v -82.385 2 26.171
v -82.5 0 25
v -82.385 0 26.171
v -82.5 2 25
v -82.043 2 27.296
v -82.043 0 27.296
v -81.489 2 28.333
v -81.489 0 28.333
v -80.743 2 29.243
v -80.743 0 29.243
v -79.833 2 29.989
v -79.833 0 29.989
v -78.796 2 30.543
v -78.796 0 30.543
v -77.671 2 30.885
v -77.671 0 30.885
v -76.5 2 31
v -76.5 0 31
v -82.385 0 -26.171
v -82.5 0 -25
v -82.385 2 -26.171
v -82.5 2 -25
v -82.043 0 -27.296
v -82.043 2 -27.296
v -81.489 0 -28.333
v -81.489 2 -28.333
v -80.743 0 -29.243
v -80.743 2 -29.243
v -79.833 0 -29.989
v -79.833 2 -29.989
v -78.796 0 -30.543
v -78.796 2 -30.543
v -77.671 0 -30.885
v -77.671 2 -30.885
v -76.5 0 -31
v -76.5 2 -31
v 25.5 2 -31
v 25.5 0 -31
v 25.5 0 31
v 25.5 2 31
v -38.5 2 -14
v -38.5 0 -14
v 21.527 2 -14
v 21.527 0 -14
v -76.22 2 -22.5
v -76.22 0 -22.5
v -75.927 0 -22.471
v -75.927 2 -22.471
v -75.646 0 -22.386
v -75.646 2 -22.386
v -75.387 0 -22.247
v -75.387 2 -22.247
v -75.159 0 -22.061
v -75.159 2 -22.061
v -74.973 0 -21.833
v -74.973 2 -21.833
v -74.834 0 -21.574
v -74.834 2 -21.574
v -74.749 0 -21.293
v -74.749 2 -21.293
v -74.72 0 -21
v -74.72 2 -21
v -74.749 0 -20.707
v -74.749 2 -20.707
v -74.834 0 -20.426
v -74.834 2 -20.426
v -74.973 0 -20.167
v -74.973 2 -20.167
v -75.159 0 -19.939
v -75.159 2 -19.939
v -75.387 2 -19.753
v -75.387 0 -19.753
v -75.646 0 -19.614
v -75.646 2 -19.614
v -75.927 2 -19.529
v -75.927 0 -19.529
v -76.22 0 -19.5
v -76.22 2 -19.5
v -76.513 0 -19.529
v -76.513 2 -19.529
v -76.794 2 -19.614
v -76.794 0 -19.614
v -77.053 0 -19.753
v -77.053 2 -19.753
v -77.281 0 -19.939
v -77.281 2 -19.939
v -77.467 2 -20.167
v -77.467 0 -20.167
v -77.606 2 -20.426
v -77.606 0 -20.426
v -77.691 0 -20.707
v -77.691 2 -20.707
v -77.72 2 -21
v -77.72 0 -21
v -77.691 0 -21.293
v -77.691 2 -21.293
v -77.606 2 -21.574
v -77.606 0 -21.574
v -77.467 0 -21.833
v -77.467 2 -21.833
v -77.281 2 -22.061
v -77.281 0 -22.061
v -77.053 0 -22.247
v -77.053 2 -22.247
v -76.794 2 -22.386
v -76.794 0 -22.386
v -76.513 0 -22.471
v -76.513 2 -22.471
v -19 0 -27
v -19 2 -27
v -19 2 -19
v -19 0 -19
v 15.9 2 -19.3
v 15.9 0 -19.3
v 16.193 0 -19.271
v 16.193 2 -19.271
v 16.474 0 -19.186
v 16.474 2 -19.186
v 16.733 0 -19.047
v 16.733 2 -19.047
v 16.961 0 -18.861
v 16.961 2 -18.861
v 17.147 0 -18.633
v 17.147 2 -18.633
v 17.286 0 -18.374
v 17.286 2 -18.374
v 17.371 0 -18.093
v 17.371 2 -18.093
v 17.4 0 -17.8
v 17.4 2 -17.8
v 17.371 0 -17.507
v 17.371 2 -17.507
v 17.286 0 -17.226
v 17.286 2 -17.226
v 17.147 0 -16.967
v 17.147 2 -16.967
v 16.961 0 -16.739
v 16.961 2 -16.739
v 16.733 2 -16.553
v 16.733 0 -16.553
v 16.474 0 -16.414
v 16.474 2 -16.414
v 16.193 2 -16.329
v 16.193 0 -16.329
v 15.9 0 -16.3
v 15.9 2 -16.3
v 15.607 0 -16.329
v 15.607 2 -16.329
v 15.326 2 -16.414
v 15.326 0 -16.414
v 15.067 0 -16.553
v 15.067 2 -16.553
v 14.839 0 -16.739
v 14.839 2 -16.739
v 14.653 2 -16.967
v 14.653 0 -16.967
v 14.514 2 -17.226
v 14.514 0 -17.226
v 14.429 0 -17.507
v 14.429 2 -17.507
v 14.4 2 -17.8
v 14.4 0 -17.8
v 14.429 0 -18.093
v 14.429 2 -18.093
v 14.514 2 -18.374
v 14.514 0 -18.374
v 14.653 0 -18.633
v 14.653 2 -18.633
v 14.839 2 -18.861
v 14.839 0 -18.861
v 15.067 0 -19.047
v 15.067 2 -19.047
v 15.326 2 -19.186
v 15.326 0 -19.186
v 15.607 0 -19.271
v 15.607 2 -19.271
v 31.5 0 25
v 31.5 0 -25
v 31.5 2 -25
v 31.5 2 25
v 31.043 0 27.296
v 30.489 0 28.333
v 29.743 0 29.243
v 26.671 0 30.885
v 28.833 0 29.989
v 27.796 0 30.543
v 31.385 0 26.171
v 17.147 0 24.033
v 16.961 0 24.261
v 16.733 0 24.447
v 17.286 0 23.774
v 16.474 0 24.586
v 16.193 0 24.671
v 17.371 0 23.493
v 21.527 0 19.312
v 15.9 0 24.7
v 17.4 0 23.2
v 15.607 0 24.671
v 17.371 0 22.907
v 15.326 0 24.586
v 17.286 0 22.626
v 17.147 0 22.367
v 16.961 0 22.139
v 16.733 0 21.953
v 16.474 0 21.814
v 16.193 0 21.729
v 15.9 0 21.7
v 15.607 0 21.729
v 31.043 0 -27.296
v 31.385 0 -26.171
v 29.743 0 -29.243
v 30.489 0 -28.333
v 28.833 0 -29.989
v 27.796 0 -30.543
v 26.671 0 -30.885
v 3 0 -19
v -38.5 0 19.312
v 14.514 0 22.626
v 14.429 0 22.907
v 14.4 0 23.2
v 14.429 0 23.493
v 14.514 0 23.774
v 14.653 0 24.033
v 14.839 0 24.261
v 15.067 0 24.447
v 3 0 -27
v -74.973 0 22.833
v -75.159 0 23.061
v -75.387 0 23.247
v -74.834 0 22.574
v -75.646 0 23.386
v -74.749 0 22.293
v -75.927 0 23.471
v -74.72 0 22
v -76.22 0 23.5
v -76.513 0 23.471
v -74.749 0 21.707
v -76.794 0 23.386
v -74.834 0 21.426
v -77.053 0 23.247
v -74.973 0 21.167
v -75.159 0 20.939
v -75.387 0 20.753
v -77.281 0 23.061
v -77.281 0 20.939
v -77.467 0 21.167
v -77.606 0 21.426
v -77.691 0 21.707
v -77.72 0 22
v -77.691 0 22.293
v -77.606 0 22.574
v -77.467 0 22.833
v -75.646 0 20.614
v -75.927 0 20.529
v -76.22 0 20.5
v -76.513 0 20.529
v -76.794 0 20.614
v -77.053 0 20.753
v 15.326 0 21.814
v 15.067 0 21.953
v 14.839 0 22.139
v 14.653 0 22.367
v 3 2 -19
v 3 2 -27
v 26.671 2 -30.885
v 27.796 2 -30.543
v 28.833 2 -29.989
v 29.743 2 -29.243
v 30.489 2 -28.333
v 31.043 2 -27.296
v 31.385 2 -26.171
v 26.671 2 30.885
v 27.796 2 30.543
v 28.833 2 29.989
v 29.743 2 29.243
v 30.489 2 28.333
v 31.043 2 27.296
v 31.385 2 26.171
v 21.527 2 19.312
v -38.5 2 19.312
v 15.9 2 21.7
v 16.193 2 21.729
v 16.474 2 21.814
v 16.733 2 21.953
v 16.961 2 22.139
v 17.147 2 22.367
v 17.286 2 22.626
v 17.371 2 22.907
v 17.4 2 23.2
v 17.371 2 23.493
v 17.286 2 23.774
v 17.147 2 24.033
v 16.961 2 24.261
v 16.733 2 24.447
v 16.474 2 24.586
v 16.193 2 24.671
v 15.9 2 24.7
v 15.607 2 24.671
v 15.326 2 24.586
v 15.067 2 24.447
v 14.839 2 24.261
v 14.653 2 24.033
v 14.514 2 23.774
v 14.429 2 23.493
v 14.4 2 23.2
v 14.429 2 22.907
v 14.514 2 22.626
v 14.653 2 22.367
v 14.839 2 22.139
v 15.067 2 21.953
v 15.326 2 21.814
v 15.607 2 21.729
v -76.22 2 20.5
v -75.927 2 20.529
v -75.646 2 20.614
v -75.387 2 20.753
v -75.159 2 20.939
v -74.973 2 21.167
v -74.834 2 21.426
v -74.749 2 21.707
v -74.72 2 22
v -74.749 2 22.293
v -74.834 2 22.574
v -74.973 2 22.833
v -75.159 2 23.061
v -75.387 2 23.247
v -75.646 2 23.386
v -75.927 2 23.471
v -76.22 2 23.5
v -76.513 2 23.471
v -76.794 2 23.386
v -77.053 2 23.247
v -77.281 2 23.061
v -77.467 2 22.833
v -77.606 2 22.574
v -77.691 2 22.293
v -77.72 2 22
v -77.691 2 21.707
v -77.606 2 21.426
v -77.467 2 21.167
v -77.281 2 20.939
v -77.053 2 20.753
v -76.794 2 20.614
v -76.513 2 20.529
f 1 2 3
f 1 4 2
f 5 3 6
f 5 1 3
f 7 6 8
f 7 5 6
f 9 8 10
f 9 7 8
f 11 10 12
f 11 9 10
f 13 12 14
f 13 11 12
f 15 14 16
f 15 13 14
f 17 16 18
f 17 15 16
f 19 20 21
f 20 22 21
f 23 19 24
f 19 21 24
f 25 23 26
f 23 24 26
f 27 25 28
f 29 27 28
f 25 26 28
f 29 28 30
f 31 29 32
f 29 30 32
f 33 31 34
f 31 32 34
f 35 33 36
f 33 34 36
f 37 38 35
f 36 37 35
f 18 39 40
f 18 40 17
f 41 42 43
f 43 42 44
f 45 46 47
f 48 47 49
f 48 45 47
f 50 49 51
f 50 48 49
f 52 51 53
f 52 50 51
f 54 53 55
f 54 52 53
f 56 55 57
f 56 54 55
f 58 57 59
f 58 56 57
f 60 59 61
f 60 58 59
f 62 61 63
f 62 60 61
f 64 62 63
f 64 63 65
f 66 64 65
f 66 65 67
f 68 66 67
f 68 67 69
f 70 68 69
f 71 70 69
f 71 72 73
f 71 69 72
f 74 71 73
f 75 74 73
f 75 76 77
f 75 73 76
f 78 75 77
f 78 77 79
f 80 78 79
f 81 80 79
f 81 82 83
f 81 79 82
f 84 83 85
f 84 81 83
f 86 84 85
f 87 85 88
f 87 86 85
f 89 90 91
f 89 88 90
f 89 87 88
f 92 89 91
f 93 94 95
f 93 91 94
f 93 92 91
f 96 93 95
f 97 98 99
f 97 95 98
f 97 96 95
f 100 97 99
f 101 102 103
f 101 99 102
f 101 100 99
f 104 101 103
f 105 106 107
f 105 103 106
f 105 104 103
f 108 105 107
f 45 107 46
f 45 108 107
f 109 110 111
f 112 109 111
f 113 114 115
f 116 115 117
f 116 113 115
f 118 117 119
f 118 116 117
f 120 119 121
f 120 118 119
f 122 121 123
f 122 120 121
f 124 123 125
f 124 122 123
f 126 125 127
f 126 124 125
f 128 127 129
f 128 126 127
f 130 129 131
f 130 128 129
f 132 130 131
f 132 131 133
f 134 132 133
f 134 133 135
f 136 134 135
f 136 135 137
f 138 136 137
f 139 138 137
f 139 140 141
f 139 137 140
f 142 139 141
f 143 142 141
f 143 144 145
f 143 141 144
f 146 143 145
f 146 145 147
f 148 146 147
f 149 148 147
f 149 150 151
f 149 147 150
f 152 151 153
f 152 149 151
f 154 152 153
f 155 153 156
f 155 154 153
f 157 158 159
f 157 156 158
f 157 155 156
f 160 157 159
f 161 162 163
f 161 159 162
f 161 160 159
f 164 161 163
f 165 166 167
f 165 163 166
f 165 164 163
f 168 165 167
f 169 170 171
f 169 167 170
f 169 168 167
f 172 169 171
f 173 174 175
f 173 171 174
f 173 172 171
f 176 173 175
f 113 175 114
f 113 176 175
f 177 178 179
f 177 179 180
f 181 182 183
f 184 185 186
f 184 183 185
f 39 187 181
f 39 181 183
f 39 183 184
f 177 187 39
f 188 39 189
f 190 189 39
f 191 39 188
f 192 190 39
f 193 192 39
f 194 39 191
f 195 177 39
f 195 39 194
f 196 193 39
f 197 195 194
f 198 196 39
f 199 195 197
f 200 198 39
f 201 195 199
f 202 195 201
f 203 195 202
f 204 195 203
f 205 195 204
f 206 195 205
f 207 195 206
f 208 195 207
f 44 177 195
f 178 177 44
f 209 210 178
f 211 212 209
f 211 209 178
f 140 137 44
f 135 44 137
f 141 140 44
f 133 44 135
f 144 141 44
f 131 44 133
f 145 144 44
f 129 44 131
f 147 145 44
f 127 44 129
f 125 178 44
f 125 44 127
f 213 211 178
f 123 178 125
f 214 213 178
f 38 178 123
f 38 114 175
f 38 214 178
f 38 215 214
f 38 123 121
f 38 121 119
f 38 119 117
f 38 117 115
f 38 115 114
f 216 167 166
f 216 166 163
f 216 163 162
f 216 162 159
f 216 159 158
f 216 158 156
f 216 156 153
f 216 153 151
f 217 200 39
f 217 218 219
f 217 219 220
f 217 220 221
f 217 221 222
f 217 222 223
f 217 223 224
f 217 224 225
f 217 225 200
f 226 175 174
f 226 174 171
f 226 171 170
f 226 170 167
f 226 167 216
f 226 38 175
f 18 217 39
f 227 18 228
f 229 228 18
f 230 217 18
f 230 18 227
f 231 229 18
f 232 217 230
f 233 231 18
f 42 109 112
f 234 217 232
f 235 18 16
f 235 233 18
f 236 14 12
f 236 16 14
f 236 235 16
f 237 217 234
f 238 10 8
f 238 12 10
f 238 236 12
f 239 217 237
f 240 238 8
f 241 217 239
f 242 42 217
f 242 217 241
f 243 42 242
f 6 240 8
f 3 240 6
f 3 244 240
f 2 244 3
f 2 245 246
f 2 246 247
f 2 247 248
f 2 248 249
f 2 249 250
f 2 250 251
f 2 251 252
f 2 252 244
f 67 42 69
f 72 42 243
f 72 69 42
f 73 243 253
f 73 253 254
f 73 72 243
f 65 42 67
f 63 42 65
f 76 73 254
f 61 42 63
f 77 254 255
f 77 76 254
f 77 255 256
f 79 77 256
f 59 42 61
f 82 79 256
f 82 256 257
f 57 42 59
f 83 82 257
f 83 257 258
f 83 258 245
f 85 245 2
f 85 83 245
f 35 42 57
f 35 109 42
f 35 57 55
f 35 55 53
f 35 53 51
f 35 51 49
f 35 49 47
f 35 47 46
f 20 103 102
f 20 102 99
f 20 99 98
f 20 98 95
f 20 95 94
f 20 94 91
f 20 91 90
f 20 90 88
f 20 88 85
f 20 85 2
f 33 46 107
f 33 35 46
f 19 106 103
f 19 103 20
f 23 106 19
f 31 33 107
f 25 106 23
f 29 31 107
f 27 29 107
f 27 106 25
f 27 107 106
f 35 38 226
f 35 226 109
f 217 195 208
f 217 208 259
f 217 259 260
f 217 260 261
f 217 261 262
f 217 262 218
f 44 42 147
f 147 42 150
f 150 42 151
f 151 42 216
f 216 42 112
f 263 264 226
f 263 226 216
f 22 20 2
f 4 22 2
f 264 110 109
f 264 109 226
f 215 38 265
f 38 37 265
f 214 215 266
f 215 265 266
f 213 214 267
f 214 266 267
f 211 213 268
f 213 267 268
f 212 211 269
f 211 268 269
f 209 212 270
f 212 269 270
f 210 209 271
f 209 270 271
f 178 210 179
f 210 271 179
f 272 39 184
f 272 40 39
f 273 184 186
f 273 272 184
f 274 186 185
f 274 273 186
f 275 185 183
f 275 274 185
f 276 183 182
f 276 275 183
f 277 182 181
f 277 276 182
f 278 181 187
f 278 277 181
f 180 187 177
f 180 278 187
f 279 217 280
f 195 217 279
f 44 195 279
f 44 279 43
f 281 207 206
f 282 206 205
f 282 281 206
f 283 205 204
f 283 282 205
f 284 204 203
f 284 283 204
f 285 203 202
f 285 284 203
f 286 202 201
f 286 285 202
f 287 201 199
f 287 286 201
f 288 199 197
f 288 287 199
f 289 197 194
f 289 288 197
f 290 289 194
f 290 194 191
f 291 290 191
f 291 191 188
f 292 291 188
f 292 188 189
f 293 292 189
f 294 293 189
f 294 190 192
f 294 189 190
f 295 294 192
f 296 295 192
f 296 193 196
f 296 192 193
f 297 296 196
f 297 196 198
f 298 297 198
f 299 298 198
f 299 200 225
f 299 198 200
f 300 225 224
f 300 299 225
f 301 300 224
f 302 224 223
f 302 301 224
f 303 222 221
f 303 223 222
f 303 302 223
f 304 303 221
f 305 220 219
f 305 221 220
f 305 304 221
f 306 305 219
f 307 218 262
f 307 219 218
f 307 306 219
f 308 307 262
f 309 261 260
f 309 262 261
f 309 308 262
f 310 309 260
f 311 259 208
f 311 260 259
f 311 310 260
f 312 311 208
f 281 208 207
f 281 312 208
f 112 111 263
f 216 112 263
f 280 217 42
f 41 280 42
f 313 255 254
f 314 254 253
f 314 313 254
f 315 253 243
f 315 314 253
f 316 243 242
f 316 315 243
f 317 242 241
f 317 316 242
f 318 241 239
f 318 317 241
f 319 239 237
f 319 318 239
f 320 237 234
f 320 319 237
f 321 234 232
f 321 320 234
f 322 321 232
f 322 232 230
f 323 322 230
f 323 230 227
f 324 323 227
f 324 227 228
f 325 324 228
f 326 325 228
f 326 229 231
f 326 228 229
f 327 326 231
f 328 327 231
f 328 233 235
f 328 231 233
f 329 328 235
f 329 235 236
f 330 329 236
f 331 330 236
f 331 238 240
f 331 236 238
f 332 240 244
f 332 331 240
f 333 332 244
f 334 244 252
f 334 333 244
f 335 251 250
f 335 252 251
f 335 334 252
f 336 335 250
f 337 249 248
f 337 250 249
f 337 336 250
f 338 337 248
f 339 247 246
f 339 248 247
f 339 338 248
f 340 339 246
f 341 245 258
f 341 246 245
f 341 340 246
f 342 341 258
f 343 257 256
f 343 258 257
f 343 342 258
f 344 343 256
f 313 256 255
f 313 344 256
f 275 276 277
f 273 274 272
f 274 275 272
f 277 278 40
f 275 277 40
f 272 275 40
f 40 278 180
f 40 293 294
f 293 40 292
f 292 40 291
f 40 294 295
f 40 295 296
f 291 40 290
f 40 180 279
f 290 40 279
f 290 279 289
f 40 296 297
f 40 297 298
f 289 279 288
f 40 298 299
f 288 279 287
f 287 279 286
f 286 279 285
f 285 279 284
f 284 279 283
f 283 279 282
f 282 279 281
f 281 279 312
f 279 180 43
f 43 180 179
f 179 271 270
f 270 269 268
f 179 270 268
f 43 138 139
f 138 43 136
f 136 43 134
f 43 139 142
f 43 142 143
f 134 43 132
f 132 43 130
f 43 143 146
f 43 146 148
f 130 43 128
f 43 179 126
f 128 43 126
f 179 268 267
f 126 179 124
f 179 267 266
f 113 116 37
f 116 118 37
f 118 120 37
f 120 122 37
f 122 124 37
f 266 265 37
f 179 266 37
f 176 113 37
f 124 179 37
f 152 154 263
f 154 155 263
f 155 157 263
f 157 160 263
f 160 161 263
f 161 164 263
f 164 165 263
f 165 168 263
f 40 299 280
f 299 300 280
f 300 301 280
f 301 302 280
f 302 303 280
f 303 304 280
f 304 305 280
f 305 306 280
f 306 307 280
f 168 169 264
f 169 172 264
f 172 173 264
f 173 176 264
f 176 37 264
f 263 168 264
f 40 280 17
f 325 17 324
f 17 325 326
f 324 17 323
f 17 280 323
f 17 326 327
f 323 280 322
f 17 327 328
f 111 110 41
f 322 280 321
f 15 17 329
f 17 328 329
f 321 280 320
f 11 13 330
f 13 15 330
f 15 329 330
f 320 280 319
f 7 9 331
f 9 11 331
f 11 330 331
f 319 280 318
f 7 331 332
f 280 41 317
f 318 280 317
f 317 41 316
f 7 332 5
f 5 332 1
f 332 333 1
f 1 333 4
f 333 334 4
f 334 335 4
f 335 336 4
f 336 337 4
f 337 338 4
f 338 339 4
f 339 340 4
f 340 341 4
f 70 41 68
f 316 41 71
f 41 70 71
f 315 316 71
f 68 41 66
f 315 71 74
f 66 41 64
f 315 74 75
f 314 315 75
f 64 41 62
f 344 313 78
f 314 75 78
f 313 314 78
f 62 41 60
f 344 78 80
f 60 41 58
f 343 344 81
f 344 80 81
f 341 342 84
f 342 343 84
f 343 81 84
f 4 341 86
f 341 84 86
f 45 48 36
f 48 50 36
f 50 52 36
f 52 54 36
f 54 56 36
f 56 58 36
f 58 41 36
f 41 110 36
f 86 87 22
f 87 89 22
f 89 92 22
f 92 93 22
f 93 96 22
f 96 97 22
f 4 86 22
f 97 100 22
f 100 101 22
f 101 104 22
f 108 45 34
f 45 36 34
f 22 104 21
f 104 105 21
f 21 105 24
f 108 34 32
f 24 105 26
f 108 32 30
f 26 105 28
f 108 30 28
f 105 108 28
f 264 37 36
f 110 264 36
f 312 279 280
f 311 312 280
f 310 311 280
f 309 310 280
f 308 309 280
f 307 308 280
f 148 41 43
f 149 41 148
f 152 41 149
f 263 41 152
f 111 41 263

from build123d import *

# Parameters (mm, degrees)
SKETCH_1_W          = 60.026557182
SKETCH_1_H          = 33.312327563
EXTRUDE_1_DEPTH     = 2
SKETCH_3_R          = 1.5
SKETCH_3_W          = 22
SKETCH_3_H          = 8
CUT_EXTRUDE_1_DEPTH = 10
FILLET_1_R          = 6


with BuildPart() as part:
    # Эскиз1 → Бобышка-Вытянуть1 (new body)
    with BuildSketch(Plane(origin=(0, 0, 0), x_dir=(1, 0, 0), z_dir=(0, 1, 0))):
        Polygon((-82.5, -31), (-82.5, -21), (-82.5, 31), (-31.5, 31), (31.5, 31), (31.5, -31), align=None)
        with Locations((-8.486721409, -2.656163782)):
            Rectangle(SKETCH_1_W, SKETCH_1_H, mode=Mode.SUBTRACT)
    extrude(amount=EXTRUDE_1_DEPTH)

    # Эскиз3 → Вырез-Вытянуть1 (cut)
    with BuildSketch(Plane.XZ.offset(-2)):
        with Locations(Location((15.9, 23.2, 0), (0, 0, 270))):
            Circle(SKETCH_3_R)
        with Locations(Location((15.9, -17.8, 0), (0, 0, 270))):
            Circle(SKETCH_3_R)
        with Locations(Location((-76.22, 22, 0), (0, 0, 270))):
            Circle(SKETCH_3_R)
        with Locations(Location((-76.22, -21, 0), (0, 0, 270))):
            Circle(SKETCH_3_R)
        with Locations((-8, -23)):
            Rectangle(SKETCH_3_W, SKETCH_3_H)
    extrude(amount=CUT_EXTRUDE_1_DEPTH, mode=Mode.SUBTRACT)

    # Скругление1
    fillet_1_edges = [part.edges().sort_by_distance(p)[0] for p in [
        (-82.5, 1, 31),
        (-82.5, 1, -31),
        (31.5, 1, -31),
        (31.5, 1, 31),
    ]]
    fillet(fillet_1_edges, radius=FILLET_1_R)


solid = part.part
